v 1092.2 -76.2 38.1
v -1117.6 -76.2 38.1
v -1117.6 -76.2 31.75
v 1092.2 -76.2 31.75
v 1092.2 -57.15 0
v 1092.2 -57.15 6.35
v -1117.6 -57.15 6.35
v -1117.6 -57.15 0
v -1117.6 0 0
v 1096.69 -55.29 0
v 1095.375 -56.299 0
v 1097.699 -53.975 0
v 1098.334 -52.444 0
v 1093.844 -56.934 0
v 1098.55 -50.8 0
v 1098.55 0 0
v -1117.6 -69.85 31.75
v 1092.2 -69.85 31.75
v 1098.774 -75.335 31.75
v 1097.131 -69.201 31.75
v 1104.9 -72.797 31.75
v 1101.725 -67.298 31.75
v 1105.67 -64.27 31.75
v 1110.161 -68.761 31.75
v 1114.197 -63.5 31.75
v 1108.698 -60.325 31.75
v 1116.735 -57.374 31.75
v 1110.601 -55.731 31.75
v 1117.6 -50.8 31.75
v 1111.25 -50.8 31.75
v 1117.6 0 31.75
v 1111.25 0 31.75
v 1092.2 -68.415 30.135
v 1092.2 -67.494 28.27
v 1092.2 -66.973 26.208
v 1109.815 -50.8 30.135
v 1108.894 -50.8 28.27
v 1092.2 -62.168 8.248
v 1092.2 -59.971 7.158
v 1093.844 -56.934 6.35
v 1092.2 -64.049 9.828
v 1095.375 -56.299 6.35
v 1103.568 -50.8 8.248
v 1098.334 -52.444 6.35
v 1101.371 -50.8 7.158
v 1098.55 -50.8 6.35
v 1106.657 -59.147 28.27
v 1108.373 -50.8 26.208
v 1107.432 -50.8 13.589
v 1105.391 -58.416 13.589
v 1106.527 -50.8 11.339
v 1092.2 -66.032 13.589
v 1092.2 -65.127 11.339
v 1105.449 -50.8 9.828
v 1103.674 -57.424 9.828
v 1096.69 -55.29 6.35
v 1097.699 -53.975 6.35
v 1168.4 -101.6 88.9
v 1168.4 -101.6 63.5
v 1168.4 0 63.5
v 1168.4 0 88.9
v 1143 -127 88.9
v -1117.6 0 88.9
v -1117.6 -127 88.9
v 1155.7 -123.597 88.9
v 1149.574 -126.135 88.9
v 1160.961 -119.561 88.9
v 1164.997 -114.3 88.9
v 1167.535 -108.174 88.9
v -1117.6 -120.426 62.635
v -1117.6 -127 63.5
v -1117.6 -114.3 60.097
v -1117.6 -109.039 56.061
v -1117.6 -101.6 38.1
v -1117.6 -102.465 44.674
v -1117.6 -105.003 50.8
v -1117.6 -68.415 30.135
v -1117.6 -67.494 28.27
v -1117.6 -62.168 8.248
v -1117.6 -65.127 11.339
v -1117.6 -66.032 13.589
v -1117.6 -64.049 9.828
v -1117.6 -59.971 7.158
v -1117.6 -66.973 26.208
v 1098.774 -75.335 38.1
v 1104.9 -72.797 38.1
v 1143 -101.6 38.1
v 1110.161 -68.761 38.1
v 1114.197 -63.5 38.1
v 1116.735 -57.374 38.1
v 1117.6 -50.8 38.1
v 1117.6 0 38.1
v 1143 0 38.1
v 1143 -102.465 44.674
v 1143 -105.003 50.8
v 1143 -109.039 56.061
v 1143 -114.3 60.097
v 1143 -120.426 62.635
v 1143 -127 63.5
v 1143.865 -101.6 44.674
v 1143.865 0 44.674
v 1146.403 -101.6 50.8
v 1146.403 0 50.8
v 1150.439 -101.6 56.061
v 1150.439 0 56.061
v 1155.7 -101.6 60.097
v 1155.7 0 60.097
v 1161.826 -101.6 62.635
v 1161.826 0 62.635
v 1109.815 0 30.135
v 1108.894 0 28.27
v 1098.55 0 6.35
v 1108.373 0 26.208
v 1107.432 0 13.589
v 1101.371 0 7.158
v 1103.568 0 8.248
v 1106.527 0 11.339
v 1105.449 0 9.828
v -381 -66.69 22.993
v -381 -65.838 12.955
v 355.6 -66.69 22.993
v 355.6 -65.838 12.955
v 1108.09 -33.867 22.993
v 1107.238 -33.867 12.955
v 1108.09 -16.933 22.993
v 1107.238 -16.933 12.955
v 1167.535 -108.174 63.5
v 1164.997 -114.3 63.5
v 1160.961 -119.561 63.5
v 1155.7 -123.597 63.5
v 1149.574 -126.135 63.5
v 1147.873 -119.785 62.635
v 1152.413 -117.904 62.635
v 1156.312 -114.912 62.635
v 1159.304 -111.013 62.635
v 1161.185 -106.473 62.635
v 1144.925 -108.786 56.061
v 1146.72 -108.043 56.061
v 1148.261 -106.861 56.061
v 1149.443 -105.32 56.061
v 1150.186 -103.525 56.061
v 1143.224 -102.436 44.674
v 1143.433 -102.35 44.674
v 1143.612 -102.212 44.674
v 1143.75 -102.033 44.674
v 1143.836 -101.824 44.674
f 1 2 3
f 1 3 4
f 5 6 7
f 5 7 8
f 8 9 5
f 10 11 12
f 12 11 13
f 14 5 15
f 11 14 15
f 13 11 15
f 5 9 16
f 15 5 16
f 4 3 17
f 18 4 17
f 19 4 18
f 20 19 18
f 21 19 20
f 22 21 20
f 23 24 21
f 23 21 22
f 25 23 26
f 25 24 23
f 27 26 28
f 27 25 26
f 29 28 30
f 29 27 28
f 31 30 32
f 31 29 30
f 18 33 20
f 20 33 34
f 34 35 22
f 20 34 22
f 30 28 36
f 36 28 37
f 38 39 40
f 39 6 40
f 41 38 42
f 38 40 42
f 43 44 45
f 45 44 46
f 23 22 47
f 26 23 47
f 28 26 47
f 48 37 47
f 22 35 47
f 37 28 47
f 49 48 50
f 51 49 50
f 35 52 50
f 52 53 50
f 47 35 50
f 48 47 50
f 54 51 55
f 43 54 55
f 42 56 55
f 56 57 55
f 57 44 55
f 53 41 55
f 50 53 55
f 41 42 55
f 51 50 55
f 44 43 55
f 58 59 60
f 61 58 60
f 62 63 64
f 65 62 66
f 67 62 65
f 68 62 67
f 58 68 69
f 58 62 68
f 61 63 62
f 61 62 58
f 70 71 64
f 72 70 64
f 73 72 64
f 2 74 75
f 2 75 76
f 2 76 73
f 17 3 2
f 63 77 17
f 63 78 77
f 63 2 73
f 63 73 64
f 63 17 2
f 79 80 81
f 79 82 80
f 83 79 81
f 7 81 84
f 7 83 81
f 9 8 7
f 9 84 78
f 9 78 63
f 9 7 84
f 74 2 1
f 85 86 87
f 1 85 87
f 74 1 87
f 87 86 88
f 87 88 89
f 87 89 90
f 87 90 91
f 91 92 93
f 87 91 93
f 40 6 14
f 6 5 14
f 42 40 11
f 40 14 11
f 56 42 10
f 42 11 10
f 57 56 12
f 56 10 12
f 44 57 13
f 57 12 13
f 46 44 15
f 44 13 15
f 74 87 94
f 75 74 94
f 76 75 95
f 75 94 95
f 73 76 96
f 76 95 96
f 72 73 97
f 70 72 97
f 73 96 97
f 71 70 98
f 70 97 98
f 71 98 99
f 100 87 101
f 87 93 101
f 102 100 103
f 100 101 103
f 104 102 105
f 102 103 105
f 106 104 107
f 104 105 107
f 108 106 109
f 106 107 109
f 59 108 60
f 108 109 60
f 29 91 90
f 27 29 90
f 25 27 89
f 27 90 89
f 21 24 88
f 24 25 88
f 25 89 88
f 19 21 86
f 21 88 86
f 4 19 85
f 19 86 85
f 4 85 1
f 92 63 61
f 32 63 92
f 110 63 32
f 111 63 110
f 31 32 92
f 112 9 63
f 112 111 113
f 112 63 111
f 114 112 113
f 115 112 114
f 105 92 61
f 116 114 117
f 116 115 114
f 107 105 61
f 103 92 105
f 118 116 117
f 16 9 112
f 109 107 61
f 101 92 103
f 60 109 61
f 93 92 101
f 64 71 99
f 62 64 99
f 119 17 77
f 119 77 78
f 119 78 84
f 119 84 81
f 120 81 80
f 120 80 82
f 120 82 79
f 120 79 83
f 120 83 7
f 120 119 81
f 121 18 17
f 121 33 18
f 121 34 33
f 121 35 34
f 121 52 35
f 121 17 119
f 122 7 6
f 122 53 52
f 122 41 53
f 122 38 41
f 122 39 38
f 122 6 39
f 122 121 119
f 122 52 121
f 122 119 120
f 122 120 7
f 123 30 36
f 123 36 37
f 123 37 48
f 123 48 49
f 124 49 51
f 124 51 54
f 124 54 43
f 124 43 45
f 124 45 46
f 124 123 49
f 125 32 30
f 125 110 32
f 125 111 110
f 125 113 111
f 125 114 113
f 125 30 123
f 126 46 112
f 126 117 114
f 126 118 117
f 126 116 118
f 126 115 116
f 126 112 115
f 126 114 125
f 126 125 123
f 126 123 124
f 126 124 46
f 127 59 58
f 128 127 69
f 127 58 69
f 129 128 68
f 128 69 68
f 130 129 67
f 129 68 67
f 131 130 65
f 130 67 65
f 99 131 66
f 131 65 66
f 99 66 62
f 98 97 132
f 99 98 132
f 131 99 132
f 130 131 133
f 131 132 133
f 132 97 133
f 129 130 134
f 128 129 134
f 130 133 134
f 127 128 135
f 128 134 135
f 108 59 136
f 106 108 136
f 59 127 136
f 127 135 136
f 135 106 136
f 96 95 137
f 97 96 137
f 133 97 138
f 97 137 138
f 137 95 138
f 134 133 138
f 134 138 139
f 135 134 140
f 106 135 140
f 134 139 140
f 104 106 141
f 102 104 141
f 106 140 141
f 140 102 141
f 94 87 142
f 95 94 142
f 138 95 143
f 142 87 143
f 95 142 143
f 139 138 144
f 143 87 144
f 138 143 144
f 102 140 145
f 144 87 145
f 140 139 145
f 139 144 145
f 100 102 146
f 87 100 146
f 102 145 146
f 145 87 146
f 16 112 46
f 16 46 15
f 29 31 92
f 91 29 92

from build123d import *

# Parameters (mm, degrees)
F0_W     = 2235.2
F0_H     = 38.1
F1_DEPTH = 76.2
F2_R     = 25.4
F5_W     = 2286
F5_H     = 127
F6_DEPTH = 50.8
F7_R     = 25.4
F8_R     = 25.4


# Not quite as in the source:
# - after a boolean that leaves OpenCascade's solid faulty, fix() repairs it


with BuildPart() as f1:
    # F0 (on Front) → F1 (new body)
    with BuildSketch(Plane.XZ):
        with Locations((0, 19.05)):
            Rectangle(F0_W, F0_H)
    extrude(amount=F1_DEPTH)

    # F2
    f2_edges = [f1.edges().sort_by_distance(p)[0] for p in [
        (1117.6, -76.2, 19.05),
    ]]
    fillet(f2_edges, radius=F2_R)

    # F4: sweep along a path in F4_path
    with BuildLine(Plane(origin=(1092.2, -76.2, 0), x_dir=(0, -1, 0), z_dir=(0, 0, -1))) as f4_path:
        Line((0, 2209.8), (0, 0))
        ThreePointArc((0, 0), (-7.4394877579, -17.9605122421), (-25.4, -25.4))
        Line((-25.4, -25.4), (-76.2, -25.4))
    # F3 (on face) → F4 (sweep, cut)
    with BuildSketch(Plane(origin=(-1117.6, 0, 0), x_dir=(0, -1, 0), z_dir=(-1, 0, 0))):
        with BuildLine():
            Line((57.15, 6.35), (57.15, 0))
            Line((57.15, 0), (76.2, 0))
            Line((76.2, 0), (76.2, 31.75))
            Line((76.2, 31.75), (69.85, 31.75))
            add(Edge.make_bspline(
                [(57.15, 6.35), (73.1378570199, 9.6669653431), (62.1549449861, 25.2057183534), (69.85, 31.75)],
                knots=[0, 0, 0, 0, 28.3980633142, 28.3980633142, 28.3980633142, 28.3980633142], degree=3))
        make_face()
    sweep(path=f4_path.line, mode=Mode.SUBTRACT)

    # F5 (on face) → F6 (join)
    with BuildSketch(Plane.XY.offset(38.1)):
        with Locations((25.4, -63.5)):
            Rectangle(F5_W, F5_H)
    extrude(amount=F6_DEPTH)

    # F7
    f7_edges = [f1.edges().sort_by_distance(p)[0] for p in [
        (1168.4, -127, 63.5),
    ]]
    fillet(f7_edges, radius=F7_R)

    # F9: sweep along a path in F9_path
    with BuildLine(Plane(origin=(1143, -127, 38.1), x_dir=(0, -1, 0), z_dir=(0, 0, -1))) as f9_path:
        Line((0, 2260.6), (0, 0))
        ThreePointArc((0, 0), (-7.4394877579, -17.9605122421), (-25.4, -25.4))
        Line((-25.4, -25.4), (-127, -25.4))
    # F8 (on face) → F9 (sweep, cut)
    with BuildSketch(Plane(origin=(-1117.6, 0, 0), x_dir=(0, -1, 0), z_dir=(-1, 0, 0))):
        with Locations((127, 38.1)):
            Circle(F8_R)
    sweep(path=f9_path.line, mode=Mode.SUBTRACT)

    add(f1.part.fix(), mode=Mode.REPLACE)


solid = f1.part
